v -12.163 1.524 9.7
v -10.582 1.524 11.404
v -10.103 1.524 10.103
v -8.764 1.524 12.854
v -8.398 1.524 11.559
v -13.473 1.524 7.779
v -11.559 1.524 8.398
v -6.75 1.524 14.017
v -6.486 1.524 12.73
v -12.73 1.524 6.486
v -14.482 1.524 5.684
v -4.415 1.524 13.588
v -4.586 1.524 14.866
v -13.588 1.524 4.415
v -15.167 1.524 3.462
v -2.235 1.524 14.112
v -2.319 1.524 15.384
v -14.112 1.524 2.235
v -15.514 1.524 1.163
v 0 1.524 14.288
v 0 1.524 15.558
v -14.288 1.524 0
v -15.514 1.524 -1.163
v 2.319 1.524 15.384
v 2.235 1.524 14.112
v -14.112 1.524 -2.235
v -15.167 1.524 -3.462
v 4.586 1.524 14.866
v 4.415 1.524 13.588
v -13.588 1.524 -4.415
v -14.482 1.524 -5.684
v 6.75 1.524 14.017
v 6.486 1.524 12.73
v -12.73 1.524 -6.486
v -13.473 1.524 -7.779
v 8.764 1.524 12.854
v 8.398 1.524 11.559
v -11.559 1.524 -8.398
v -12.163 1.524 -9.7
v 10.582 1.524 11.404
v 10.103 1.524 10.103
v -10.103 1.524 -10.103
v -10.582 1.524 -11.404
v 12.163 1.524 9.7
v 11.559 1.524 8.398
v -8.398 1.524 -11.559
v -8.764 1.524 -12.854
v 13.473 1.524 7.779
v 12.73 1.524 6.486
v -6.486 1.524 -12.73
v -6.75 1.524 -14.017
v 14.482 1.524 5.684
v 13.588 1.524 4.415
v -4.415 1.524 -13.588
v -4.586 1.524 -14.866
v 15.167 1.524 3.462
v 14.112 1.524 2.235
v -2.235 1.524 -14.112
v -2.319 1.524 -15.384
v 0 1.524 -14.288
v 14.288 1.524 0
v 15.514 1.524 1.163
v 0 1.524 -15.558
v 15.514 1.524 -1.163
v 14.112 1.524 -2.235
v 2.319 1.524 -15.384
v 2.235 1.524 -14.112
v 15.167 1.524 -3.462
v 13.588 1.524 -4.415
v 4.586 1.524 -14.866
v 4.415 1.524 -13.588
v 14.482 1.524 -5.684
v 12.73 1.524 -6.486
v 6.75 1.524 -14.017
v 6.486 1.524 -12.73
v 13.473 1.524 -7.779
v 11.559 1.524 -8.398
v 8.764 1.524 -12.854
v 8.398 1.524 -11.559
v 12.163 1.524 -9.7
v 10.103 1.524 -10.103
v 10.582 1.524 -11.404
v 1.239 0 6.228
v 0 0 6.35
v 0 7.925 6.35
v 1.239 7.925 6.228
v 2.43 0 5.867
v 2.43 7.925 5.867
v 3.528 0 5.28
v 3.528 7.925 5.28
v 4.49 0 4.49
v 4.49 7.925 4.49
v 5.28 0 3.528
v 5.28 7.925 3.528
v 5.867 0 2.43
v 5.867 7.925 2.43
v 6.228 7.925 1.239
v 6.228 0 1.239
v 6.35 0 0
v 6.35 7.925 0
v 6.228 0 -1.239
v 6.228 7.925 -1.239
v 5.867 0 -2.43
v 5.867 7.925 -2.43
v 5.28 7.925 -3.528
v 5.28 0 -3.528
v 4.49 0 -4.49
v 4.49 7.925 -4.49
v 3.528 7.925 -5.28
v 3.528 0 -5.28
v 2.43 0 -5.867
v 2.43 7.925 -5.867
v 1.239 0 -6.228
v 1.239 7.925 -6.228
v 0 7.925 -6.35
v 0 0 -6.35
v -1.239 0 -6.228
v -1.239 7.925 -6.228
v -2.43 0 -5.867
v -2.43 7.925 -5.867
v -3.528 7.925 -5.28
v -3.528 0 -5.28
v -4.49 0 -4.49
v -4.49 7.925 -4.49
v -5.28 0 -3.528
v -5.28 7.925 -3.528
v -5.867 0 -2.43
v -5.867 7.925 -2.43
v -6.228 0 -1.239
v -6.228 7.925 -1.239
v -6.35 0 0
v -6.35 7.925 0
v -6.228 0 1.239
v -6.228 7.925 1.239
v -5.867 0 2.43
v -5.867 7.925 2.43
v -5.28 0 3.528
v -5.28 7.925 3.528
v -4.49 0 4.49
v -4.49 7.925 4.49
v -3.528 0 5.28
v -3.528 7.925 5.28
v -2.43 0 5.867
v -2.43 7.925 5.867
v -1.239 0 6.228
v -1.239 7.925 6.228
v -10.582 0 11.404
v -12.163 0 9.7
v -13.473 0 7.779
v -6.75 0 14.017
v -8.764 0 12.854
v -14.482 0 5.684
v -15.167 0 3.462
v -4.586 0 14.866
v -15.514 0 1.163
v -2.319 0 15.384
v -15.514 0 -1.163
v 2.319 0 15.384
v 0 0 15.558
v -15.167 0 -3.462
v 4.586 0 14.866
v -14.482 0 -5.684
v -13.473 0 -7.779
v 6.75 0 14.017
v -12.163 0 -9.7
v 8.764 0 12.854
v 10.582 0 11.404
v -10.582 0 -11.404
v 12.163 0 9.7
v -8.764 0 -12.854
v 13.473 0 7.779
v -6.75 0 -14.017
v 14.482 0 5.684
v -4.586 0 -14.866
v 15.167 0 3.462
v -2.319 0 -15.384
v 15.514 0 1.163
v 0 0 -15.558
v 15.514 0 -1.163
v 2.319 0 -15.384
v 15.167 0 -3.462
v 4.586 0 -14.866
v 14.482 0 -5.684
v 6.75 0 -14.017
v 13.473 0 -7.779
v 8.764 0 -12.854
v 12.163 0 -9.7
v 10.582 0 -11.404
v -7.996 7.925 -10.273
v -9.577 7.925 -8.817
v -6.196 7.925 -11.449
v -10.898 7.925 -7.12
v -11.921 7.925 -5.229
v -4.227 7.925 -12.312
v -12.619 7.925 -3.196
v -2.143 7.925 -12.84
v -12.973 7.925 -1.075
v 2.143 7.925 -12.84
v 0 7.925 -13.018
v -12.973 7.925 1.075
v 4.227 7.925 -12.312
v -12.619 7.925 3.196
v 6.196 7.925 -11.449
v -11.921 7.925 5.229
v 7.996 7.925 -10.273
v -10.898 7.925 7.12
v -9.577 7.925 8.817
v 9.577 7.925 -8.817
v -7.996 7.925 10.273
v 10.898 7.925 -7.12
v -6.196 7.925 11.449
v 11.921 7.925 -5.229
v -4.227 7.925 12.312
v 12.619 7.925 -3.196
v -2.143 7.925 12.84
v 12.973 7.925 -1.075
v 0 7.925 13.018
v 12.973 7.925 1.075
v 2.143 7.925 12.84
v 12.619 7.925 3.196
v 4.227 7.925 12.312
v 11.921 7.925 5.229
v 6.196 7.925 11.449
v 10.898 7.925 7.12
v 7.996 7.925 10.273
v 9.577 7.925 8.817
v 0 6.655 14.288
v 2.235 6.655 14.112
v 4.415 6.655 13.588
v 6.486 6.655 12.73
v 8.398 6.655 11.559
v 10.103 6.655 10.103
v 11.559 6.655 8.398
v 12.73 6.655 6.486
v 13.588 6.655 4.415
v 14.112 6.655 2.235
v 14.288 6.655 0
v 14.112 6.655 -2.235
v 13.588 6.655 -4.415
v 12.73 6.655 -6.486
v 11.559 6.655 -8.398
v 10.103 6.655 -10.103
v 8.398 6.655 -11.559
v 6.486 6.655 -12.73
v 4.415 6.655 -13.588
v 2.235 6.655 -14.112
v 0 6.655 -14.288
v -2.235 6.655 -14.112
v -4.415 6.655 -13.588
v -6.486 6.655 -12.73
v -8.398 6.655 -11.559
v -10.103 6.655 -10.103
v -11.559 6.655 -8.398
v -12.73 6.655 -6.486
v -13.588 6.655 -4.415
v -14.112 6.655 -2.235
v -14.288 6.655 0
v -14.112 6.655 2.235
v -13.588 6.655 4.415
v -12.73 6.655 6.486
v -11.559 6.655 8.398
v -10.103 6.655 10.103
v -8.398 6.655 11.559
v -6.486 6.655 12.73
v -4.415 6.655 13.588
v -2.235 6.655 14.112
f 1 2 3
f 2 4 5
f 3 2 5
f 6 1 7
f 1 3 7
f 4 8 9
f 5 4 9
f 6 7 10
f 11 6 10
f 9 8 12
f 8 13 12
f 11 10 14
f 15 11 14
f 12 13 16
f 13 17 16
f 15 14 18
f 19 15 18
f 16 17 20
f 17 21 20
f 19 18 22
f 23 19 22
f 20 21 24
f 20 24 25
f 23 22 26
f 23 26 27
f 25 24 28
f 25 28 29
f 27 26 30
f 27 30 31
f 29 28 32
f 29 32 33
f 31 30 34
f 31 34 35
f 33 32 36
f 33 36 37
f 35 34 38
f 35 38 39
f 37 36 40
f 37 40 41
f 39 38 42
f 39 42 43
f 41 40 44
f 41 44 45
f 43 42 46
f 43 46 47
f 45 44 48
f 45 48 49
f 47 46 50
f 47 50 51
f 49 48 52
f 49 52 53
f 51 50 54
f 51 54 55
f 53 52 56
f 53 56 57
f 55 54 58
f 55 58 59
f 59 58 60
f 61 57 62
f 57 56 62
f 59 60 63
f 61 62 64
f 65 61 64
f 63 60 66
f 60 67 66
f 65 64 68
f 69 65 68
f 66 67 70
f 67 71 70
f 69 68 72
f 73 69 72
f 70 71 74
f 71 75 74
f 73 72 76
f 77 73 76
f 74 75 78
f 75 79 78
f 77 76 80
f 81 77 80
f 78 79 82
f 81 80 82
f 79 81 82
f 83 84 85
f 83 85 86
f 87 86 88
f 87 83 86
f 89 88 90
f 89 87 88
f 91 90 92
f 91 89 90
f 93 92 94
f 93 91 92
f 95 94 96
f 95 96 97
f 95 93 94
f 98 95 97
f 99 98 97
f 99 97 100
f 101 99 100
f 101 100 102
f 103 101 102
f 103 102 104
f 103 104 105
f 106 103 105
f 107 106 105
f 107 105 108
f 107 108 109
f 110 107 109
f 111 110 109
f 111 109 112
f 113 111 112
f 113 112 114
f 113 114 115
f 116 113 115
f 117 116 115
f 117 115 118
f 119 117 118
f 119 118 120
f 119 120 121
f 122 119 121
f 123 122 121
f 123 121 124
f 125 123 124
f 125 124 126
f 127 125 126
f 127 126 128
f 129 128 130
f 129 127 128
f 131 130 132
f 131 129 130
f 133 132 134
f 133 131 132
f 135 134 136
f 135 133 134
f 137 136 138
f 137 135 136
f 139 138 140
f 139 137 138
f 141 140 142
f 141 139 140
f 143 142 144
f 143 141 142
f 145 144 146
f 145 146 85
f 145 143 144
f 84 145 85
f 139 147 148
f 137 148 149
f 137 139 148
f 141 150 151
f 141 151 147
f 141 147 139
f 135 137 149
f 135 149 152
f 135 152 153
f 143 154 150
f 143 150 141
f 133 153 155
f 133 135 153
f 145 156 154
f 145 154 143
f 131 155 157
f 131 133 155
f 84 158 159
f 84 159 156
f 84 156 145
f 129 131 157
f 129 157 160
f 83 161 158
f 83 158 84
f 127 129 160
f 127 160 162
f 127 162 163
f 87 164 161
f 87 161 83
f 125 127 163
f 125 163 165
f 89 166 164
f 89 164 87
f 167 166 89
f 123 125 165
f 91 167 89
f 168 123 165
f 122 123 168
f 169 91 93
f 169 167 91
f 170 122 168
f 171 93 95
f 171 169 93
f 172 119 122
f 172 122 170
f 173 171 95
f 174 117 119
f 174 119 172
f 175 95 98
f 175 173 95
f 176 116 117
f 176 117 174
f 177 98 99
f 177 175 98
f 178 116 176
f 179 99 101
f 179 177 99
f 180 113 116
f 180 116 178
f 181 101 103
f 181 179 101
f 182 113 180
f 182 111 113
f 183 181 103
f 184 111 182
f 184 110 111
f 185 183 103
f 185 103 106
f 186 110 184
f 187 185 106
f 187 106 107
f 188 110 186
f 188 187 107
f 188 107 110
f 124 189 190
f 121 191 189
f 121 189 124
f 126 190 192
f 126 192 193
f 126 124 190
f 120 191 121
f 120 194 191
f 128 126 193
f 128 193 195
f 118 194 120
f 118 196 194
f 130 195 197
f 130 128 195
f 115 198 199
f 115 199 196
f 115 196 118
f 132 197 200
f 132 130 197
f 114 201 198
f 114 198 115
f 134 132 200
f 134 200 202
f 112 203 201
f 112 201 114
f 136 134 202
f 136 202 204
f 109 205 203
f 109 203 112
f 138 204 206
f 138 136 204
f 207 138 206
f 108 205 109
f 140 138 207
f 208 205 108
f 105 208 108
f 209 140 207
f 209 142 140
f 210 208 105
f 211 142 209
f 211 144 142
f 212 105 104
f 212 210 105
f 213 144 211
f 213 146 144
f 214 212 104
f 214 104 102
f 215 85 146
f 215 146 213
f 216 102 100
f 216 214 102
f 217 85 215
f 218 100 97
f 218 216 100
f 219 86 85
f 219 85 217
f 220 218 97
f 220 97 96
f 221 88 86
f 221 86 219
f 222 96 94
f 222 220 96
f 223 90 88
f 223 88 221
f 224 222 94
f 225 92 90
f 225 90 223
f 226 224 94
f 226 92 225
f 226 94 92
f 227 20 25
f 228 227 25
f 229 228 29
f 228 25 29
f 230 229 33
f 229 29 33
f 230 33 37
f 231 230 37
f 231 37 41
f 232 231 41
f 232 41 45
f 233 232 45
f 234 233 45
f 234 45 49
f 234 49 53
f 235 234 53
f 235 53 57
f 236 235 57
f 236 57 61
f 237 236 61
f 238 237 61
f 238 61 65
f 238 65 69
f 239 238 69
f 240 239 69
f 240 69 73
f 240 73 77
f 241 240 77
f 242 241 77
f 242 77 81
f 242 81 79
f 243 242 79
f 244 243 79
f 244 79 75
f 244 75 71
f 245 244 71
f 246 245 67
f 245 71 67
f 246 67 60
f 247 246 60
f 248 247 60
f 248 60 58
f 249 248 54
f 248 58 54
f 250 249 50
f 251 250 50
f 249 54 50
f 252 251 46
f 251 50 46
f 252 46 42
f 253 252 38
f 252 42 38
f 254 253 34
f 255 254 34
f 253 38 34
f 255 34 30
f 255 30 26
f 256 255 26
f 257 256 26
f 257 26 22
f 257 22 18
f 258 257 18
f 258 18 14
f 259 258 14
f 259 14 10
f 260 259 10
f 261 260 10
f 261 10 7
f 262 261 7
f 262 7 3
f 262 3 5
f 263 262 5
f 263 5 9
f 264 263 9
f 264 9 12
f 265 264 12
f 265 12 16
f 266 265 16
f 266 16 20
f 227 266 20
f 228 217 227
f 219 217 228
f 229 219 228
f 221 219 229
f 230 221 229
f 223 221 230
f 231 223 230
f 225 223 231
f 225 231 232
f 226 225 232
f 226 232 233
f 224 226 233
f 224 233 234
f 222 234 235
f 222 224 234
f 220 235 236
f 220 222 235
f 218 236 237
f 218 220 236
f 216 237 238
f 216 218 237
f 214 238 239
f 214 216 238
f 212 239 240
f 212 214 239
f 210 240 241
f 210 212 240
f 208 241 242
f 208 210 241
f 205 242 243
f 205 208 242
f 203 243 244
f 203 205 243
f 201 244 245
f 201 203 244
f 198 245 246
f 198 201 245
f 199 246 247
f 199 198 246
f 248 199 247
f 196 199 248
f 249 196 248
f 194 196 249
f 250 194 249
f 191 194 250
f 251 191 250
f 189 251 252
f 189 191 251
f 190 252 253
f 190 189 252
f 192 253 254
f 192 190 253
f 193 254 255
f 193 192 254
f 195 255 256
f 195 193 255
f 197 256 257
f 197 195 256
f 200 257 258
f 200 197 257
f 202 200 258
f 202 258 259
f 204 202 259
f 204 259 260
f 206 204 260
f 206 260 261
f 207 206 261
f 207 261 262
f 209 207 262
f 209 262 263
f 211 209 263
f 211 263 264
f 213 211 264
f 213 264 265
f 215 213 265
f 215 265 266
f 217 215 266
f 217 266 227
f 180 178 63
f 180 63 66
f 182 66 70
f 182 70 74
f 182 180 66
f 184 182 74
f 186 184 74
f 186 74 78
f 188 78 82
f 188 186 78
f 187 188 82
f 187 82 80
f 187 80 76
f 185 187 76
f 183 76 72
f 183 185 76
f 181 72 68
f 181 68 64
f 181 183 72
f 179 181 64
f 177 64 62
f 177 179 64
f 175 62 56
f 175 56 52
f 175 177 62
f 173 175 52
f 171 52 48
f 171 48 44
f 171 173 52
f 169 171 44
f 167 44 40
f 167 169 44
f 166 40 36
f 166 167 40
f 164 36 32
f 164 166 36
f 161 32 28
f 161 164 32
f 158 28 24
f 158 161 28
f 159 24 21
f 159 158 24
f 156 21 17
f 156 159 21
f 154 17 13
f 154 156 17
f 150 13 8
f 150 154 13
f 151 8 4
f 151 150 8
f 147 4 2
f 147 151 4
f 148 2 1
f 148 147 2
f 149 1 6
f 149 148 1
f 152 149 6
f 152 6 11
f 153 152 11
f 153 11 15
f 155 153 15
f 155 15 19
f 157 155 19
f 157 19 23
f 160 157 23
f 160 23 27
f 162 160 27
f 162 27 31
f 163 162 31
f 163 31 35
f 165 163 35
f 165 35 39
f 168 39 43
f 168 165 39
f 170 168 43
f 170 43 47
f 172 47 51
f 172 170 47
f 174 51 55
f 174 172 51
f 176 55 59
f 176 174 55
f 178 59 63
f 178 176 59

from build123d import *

# Parameters (mm, degrees)
SKETCH1_R           = 14.2875
SKETCH1_R_2         = 6.35
BOSS_EXTRUDE1_DEPTH = 7.9248
CHAMFER1_SIZE       = 1.27
SKETCH2_R           = 15.5575
SKETCH2_R_2         = 6.35
BOSS_EXTRUDE2_DEPTH = 1.524


with BuildPart() as part:
    # Sketch1 → Boss-Extrude1 (new body)
    with BuildSketch(Plane(origin=(0, 0, 0), x_dir=(1, 0, 0), z_dir=(0, 1, 0))):
        with Locations(Location((0, 0, 0), (0, 0, 270))):
            Circle(SKETCH1_R)
        with Locations(Location((0, 0, 0), (0, 0, 270))):
            Circle(SKETCH1_R_2, mode=Mode.SUBTRACT)
    extrude(amount=BOSS_EXTRUDE1_DEPTH)

    # Chamfer1
    chamfer1_edges = [part.edges().sort_by_distance(p)[0] for p in [
        (0, 7.9248, -14.2875),
    ]]
    chamfer(chamfer1_edges, length=CHAMFER1_SIZE)

    # Sketch2 → Boss-Extrude2 (add)
    with BuildSketch(Plane.XZ):
        with Locations(Location((0, 0, 0), (0, 0, 270))):
            Circle(SKETCH2_R)
        with Locations(Location((0, 0, 0), (0, 0, 90))):
            Circle(SKETCH2_R_2, mode=Mode.SUBTRACT)
    extrude(amount=-BOSS_EXTRUDE2_DEPTH)


solid = part.part
